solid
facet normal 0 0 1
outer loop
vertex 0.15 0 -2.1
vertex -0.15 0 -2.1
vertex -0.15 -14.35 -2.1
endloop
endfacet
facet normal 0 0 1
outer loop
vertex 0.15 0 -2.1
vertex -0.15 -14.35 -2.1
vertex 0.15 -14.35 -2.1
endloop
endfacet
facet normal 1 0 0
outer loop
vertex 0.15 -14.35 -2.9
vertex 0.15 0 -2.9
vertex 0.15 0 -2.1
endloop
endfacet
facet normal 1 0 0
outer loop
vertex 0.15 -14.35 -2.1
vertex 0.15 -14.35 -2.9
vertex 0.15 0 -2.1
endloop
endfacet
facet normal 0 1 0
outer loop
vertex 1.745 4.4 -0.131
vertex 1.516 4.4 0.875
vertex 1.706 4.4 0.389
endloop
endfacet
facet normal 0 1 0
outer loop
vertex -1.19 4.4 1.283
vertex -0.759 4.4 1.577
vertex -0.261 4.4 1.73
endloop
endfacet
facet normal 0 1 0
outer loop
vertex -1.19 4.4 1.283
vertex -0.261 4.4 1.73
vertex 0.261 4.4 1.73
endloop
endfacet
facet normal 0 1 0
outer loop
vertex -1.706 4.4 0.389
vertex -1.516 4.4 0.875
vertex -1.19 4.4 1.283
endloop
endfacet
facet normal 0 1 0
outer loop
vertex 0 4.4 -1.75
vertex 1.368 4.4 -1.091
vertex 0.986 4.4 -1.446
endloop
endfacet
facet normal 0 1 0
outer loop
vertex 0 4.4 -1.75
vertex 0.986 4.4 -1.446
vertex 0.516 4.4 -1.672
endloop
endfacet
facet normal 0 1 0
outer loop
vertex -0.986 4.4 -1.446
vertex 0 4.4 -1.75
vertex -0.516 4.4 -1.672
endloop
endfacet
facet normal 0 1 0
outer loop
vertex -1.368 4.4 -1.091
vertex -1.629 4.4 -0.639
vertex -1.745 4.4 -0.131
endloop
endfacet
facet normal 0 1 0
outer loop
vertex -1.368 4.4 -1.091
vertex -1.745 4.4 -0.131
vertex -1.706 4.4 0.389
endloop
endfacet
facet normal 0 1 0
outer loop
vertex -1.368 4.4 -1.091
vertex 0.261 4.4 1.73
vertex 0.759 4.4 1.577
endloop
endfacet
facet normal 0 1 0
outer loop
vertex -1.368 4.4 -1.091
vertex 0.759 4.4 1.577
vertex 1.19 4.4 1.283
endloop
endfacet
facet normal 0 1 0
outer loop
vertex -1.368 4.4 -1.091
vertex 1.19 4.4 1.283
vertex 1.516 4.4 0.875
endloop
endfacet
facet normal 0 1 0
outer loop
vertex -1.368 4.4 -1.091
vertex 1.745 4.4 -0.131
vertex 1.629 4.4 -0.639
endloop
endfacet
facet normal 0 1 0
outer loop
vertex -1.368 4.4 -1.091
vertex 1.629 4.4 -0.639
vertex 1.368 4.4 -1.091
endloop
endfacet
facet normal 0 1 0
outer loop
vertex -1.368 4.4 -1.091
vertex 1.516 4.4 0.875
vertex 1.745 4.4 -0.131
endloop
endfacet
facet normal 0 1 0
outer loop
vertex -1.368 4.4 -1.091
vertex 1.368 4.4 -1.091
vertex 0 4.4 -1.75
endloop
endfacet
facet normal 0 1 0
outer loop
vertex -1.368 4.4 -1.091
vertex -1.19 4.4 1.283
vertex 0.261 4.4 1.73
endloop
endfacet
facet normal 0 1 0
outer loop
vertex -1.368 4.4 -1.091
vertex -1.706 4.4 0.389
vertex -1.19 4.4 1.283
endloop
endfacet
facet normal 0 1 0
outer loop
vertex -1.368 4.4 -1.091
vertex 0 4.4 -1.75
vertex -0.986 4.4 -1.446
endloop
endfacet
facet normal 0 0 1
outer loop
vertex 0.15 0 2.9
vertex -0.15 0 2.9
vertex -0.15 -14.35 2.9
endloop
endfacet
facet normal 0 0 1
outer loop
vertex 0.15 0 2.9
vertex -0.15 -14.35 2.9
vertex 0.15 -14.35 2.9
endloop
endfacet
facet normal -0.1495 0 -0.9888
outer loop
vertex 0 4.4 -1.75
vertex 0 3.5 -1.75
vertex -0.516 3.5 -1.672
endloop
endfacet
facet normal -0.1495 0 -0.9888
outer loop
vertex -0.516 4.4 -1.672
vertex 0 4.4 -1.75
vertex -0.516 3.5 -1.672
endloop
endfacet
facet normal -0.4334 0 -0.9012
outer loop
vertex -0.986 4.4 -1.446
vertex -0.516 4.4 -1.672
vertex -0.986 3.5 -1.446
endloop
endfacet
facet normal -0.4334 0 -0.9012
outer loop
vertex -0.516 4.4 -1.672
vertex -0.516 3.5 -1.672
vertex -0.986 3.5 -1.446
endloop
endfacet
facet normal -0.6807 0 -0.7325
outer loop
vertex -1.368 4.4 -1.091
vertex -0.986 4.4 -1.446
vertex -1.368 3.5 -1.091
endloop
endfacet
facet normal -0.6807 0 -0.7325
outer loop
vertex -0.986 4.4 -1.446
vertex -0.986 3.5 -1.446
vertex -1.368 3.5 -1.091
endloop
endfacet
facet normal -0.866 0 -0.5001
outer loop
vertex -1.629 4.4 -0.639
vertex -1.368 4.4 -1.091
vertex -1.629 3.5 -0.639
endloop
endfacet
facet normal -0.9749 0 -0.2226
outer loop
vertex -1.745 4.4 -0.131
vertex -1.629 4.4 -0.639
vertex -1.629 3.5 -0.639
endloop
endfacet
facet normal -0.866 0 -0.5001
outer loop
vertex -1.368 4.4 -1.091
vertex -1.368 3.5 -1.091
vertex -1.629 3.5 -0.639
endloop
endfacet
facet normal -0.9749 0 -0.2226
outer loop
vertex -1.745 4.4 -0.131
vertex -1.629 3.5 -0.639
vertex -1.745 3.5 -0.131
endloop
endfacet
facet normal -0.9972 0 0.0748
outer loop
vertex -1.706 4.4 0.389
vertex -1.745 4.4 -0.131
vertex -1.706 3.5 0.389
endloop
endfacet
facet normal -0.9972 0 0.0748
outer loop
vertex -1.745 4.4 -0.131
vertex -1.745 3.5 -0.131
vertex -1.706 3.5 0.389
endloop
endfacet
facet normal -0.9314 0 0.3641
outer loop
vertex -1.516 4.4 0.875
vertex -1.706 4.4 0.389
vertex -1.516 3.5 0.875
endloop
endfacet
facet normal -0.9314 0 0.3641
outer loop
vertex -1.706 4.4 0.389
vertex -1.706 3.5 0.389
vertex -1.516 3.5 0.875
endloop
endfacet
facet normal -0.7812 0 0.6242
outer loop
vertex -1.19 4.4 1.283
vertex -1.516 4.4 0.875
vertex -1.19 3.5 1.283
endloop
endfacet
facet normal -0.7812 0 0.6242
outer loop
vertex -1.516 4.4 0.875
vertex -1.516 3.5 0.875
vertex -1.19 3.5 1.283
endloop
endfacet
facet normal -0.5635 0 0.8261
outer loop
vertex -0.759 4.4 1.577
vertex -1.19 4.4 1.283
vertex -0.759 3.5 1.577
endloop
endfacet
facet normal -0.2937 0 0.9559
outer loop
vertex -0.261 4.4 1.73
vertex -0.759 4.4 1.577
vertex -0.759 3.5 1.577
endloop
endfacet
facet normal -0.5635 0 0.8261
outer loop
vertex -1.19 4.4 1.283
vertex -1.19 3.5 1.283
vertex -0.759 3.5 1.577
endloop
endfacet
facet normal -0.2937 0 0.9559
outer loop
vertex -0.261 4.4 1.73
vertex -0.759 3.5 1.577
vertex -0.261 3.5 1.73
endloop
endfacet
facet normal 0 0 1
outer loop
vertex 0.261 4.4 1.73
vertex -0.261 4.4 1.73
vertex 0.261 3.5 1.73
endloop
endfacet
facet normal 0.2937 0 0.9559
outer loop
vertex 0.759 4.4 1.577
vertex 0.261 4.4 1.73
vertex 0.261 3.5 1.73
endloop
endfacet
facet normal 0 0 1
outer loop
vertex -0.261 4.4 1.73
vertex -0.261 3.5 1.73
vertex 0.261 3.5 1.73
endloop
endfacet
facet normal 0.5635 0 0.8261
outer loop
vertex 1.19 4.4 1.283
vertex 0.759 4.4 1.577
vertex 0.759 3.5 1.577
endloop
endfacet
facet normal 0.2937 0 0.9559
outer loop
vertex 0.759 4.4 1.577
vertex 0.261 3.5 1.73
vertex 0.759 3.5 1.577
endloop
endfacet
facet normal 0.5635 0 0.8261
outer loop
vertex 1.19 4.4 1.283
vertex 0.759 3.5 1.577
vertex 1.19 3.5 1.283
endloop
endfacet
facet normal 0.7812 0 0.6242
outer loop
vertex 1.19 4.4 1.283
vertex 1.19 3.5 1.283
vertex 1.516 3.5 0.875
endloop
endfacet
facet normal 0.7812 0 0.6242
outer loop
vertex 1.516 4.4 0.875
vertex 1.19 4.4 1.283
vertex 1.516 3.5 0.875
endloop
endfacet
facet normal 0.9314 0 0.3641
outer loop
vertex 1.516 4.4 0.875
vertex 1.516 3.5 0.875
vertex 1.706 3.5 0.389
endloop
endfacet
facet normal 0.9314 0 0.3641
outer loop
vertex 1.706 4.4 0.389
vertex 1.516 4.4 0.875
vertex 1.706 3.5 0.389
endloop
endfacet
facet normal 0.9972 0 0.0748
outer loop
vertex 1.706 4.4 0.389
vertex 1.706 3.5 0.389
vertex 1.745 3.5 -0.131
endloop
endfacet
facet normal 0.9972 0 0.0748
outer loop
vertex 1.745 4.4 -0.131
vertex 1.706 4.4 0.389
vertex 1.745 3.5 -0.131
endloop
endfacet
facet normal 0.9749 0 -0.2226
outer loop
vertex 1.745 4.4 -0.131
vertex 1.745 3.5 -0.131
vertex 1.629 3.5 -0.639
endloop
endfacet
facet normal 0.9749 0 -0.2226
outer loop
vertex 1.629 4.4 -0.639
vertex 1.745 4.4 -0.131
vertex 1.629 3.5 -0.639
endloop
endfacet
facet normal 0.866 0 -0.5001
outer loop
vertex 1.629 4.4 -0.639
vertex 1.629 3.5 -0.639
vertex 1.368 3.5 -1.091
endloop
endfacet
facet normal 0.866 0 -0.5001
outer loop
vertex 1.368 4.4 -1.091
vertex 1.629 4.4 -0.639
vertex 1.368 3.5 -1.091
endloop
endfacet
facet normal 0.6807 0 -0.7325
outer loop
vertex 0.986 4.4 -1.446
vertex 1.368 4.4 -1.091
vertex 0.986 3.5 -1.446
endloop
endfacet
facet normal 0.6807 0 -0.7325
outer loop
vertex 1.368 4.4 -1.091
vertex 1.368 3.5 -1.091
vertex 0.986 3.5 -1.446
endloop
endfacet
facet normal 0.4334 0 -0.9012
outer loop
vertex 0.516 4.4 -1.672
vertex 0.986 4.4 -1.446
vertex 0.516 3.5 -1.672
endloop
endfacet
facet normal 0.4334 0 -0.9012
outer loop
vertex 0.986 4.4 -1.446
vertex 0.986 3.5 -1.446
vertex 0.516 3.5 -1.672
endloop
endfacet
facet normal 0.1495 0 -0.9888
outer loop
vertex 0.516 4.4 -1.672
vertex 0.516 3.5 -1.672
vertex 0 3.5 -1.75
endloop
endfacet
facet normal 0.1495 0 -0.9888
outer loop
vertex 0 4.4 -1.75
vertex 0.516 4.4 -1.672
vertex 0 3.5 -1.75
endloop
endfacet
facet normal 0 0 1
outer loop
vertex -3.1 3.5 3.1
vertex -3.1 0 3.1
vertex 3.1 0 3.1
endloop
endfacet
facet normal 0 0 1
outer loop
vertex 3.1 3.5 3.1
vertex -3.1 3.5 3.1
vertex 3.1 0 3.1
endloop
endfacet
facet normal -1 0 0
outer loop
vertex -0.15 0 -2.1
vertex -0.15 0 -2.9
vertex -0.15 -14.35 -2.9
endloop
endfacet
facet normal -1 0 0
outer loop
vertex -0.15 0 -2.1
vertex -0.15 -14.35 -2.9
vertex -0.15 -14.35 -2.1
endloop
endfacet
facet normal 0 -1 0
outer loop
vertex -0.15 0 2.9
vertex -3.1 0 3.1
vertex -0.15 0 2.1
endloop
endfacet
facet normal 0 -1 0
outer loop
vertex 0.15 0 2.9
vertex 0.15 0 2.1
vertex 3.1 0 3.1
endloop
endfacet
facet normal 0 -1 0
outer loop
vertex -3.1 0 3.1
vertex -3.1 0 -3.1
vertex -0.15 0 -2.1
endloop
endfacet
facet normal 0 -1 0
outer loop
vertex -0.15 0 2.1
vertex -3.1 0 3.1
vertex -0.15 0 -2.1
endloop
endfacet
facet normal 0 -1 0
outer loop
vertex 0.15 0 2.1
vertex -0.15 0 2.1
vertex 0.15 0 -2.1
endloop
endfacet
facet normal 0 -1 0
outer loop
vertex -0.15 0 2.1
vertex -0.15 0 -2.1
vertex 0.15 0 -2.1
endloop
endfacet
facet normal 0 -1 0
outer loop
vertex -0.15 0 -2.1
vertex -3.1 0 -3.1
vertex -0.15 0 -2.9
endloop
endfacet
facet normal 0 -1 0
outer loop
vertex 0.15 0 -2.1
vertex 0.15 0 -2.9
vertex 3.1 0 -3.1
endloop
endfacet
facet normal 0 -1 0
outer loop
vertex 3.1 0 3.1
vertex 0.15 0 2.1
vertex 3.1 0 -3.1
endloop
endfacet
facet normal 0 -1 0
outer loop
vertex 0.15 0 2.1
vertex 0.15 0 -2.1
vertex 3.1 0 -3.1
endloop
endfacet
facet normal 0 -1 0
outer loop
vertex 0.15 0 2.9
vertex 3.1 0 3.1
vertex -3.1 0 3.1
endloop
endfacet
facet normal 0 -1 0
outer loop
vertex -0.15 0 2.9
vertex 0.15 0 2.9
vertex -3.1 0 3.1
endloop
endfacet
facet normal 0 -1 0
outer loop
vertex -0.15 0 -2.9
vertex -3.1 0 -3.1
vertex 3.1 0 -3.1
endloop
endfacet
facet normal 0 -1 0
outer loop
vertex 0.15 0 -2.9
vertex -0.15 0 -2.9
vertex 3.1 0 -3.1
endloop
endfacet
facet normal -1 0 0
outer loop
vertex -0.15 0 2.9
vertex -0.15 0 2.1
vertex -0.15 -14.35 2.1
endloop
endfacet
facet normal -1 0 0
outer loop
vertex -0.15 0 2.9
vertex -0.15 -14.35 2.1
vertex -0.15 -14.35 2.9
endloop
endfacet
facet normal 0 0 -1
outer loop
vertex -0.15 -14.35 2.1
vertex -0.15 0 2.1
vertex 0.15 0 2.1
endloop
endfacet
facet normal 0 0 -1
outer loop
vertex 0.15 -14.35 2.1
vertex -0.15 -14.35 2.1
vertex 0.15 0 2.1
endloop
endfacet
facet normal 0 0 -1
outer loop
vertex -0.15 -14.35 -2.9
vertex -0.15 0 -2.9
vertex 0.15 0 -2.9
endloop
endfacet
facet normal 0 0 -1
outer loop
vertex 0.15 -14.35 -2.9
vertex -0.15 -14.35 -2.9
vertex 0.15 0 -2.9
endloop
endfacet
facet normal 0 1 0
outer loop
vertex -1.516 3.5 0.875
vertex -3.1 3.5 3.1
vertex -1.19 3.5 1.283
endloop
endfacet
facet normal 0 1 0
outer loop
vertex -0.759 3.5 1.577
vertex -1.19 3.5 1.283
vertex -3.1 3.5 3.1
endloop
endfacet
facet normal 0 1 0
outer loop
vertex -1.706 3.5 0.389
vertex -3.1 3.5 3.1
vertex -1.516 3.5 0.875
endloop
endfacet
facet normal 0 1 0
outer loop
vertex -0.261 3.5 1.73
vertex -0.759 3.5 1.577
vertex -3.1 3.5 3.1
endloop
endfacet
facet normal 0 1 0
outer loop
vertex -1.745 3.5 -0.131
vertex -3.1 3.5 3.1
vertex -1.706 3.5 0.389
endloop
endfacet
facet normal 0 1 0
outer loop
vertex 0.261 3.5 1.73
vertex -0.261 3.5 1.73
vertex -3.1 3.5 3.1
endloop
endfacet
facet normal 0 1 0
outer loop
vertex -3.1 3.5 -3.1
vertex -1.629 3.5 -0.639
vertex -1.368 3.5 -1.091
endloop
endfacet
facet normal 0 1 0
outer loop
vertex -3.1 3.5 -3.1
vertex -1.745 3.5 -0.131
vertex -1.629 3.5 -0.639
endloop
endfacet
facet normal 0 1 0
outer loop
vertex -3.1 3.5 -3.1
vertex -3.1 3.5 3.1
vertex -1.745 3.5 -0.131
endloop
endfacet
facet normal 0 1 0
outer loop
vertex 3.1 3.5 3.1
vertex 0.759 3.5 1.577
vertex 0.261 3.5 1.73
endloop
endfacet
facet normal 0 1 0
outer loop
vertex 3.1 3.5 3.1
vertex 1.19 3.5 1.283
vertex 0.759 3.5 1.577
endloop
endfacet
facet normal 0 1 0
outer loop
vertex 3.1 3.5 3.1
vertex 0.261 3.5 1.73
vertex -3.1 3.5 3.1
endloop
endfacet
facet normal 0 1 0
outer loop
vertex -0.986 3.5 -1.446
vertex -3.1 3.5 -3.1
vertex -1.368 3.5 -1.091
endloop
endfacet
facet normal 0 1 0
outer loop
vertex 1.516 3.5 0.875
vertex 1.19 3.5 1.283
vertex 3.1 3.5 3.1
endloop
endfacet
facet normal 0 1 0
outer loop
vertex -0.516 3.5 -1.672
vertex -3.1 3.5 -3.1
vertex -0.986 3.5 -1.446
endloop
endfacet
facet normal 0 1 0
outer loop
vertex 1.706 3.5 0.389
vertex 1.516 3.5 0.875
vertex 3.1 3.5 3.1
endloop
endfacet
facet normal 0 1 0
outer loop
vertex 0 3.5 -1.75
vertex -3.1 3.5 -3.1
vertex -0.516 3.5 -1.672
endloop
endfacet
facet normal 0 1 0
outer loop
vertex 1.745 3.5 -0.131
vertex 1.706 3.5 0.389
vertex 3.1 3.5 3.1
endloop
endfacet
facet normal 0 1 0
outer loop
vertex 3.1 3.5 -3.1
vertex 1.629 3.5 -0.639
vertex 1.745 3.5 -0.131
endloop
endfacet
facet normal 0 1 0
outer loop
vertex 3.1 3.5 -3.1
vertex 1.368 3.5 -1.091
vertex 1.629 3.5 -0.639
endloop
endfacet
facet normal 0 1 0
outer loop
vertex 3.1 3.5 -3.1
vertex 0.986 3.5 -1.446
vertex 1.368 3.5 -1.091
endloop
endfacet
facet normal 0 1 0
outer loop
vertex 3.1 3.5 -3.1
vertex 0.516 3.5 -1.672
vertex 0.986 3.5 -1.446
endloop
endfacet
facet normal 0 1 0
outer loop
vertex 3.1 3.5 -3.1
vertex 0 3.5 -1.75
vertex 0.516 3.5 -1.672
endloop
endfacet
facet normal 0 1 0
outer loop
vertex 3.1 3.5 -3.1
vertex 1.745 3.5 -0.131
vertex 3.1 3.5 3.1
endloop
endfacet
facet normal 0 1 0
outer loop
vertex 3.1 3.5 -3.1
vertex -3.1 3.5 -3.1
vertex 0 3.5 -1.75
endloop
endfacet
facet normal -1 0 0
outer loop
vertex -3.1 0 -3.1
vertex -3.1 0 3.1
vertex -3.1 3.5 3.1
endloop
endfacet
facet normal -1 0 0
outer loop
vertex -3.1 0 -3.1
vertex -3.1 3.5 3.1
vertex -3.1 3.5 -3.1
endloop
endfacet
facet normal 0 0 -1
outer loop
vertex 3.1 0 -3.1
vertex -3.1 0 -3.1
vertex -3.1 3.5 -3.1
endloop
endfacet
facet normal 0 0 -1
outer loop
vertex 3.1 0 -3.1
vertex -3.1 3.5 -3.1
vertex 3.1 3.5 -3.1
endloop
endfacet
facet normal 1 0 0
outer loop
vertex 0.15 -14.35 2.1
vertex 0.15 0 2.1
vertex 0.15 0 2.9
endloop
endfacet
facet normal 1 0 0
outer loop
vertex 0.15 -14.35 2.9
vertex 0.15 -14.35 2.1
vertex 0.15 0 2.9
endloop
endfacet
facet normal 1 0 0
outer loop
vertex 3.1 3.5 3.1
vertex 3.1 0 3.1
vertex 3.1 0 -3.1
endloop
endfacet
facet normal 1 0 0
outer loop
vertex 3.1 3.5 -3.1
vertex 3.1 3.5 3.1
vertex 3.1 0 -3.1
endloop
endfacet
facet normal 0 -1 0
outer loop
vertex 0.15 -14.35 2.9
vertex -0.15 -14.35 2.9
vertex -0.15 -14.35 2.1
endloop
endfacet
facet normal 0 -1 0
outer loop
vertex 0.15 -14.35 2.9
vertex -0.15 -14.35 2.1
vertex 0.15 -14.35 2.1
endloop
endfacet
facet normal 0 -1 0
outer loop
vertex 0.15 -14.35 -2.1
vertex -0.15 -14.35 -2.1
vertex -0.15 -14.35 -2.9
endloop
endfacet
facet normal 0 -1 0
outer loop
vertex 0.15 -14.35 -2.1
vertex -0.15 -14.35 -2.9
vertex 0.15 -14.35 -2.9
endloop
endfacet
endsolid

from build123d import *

# Parameters (mm, degrees)
SKETCH_1_W      = 6.2
SKETCH_1_H      = 6.2
EXTRUDE_1_DEPTH = 3.5
SKETCH_2_R      = 1.75
EXTRUDE_2_DEPTH = 0.9
SKETCH_3_W      = 0.3
SKETCH_3_H      = 0.8
EXTRUDE_3_DEPTH = 14.35


with BuildPart() as part:
    # Эскиз1 → Бобышка-Вытянуть1 (new body)
    with BuildSketch(Plane(origin=(0, 0, 0), x_dir=(1, 0, 0), z_dir=(0, 1, 0))):
        Rectangle(SKETCH_1_W, SKETCH_1_H)
    extrude(amount=EXTRUDE_1_DEPTH)

    # Эскиз2 → Бобышка-Вытянуть2 (add)
    with BuildSketch(Plane(origin=(0, 3.5, 0), x_dir=(1, 0, 0), z_dir=(0, 1, 0))):
        with Locations(Location((0, 0, 0), (0, 0, 90))):
            Circle(SKETCH_2_R)
    extrude(amount=EXTRUDE_2_DEPTH)

    # Эскиз3 → Бобышка-Вытянуть3 (add)
    with BuildSketch(Plane.XZ):
        with Locations((0, 2.5)):
            Rectangle(SKETCH_3_W, SKETCH_3_H)
        with Locations((0, -2.5)):
            Rectangle(SKETCH_3_W, SKETCH_3_H)
    extrude(amount=EXTRUDE_3_DEPTH)


solid = part.part
